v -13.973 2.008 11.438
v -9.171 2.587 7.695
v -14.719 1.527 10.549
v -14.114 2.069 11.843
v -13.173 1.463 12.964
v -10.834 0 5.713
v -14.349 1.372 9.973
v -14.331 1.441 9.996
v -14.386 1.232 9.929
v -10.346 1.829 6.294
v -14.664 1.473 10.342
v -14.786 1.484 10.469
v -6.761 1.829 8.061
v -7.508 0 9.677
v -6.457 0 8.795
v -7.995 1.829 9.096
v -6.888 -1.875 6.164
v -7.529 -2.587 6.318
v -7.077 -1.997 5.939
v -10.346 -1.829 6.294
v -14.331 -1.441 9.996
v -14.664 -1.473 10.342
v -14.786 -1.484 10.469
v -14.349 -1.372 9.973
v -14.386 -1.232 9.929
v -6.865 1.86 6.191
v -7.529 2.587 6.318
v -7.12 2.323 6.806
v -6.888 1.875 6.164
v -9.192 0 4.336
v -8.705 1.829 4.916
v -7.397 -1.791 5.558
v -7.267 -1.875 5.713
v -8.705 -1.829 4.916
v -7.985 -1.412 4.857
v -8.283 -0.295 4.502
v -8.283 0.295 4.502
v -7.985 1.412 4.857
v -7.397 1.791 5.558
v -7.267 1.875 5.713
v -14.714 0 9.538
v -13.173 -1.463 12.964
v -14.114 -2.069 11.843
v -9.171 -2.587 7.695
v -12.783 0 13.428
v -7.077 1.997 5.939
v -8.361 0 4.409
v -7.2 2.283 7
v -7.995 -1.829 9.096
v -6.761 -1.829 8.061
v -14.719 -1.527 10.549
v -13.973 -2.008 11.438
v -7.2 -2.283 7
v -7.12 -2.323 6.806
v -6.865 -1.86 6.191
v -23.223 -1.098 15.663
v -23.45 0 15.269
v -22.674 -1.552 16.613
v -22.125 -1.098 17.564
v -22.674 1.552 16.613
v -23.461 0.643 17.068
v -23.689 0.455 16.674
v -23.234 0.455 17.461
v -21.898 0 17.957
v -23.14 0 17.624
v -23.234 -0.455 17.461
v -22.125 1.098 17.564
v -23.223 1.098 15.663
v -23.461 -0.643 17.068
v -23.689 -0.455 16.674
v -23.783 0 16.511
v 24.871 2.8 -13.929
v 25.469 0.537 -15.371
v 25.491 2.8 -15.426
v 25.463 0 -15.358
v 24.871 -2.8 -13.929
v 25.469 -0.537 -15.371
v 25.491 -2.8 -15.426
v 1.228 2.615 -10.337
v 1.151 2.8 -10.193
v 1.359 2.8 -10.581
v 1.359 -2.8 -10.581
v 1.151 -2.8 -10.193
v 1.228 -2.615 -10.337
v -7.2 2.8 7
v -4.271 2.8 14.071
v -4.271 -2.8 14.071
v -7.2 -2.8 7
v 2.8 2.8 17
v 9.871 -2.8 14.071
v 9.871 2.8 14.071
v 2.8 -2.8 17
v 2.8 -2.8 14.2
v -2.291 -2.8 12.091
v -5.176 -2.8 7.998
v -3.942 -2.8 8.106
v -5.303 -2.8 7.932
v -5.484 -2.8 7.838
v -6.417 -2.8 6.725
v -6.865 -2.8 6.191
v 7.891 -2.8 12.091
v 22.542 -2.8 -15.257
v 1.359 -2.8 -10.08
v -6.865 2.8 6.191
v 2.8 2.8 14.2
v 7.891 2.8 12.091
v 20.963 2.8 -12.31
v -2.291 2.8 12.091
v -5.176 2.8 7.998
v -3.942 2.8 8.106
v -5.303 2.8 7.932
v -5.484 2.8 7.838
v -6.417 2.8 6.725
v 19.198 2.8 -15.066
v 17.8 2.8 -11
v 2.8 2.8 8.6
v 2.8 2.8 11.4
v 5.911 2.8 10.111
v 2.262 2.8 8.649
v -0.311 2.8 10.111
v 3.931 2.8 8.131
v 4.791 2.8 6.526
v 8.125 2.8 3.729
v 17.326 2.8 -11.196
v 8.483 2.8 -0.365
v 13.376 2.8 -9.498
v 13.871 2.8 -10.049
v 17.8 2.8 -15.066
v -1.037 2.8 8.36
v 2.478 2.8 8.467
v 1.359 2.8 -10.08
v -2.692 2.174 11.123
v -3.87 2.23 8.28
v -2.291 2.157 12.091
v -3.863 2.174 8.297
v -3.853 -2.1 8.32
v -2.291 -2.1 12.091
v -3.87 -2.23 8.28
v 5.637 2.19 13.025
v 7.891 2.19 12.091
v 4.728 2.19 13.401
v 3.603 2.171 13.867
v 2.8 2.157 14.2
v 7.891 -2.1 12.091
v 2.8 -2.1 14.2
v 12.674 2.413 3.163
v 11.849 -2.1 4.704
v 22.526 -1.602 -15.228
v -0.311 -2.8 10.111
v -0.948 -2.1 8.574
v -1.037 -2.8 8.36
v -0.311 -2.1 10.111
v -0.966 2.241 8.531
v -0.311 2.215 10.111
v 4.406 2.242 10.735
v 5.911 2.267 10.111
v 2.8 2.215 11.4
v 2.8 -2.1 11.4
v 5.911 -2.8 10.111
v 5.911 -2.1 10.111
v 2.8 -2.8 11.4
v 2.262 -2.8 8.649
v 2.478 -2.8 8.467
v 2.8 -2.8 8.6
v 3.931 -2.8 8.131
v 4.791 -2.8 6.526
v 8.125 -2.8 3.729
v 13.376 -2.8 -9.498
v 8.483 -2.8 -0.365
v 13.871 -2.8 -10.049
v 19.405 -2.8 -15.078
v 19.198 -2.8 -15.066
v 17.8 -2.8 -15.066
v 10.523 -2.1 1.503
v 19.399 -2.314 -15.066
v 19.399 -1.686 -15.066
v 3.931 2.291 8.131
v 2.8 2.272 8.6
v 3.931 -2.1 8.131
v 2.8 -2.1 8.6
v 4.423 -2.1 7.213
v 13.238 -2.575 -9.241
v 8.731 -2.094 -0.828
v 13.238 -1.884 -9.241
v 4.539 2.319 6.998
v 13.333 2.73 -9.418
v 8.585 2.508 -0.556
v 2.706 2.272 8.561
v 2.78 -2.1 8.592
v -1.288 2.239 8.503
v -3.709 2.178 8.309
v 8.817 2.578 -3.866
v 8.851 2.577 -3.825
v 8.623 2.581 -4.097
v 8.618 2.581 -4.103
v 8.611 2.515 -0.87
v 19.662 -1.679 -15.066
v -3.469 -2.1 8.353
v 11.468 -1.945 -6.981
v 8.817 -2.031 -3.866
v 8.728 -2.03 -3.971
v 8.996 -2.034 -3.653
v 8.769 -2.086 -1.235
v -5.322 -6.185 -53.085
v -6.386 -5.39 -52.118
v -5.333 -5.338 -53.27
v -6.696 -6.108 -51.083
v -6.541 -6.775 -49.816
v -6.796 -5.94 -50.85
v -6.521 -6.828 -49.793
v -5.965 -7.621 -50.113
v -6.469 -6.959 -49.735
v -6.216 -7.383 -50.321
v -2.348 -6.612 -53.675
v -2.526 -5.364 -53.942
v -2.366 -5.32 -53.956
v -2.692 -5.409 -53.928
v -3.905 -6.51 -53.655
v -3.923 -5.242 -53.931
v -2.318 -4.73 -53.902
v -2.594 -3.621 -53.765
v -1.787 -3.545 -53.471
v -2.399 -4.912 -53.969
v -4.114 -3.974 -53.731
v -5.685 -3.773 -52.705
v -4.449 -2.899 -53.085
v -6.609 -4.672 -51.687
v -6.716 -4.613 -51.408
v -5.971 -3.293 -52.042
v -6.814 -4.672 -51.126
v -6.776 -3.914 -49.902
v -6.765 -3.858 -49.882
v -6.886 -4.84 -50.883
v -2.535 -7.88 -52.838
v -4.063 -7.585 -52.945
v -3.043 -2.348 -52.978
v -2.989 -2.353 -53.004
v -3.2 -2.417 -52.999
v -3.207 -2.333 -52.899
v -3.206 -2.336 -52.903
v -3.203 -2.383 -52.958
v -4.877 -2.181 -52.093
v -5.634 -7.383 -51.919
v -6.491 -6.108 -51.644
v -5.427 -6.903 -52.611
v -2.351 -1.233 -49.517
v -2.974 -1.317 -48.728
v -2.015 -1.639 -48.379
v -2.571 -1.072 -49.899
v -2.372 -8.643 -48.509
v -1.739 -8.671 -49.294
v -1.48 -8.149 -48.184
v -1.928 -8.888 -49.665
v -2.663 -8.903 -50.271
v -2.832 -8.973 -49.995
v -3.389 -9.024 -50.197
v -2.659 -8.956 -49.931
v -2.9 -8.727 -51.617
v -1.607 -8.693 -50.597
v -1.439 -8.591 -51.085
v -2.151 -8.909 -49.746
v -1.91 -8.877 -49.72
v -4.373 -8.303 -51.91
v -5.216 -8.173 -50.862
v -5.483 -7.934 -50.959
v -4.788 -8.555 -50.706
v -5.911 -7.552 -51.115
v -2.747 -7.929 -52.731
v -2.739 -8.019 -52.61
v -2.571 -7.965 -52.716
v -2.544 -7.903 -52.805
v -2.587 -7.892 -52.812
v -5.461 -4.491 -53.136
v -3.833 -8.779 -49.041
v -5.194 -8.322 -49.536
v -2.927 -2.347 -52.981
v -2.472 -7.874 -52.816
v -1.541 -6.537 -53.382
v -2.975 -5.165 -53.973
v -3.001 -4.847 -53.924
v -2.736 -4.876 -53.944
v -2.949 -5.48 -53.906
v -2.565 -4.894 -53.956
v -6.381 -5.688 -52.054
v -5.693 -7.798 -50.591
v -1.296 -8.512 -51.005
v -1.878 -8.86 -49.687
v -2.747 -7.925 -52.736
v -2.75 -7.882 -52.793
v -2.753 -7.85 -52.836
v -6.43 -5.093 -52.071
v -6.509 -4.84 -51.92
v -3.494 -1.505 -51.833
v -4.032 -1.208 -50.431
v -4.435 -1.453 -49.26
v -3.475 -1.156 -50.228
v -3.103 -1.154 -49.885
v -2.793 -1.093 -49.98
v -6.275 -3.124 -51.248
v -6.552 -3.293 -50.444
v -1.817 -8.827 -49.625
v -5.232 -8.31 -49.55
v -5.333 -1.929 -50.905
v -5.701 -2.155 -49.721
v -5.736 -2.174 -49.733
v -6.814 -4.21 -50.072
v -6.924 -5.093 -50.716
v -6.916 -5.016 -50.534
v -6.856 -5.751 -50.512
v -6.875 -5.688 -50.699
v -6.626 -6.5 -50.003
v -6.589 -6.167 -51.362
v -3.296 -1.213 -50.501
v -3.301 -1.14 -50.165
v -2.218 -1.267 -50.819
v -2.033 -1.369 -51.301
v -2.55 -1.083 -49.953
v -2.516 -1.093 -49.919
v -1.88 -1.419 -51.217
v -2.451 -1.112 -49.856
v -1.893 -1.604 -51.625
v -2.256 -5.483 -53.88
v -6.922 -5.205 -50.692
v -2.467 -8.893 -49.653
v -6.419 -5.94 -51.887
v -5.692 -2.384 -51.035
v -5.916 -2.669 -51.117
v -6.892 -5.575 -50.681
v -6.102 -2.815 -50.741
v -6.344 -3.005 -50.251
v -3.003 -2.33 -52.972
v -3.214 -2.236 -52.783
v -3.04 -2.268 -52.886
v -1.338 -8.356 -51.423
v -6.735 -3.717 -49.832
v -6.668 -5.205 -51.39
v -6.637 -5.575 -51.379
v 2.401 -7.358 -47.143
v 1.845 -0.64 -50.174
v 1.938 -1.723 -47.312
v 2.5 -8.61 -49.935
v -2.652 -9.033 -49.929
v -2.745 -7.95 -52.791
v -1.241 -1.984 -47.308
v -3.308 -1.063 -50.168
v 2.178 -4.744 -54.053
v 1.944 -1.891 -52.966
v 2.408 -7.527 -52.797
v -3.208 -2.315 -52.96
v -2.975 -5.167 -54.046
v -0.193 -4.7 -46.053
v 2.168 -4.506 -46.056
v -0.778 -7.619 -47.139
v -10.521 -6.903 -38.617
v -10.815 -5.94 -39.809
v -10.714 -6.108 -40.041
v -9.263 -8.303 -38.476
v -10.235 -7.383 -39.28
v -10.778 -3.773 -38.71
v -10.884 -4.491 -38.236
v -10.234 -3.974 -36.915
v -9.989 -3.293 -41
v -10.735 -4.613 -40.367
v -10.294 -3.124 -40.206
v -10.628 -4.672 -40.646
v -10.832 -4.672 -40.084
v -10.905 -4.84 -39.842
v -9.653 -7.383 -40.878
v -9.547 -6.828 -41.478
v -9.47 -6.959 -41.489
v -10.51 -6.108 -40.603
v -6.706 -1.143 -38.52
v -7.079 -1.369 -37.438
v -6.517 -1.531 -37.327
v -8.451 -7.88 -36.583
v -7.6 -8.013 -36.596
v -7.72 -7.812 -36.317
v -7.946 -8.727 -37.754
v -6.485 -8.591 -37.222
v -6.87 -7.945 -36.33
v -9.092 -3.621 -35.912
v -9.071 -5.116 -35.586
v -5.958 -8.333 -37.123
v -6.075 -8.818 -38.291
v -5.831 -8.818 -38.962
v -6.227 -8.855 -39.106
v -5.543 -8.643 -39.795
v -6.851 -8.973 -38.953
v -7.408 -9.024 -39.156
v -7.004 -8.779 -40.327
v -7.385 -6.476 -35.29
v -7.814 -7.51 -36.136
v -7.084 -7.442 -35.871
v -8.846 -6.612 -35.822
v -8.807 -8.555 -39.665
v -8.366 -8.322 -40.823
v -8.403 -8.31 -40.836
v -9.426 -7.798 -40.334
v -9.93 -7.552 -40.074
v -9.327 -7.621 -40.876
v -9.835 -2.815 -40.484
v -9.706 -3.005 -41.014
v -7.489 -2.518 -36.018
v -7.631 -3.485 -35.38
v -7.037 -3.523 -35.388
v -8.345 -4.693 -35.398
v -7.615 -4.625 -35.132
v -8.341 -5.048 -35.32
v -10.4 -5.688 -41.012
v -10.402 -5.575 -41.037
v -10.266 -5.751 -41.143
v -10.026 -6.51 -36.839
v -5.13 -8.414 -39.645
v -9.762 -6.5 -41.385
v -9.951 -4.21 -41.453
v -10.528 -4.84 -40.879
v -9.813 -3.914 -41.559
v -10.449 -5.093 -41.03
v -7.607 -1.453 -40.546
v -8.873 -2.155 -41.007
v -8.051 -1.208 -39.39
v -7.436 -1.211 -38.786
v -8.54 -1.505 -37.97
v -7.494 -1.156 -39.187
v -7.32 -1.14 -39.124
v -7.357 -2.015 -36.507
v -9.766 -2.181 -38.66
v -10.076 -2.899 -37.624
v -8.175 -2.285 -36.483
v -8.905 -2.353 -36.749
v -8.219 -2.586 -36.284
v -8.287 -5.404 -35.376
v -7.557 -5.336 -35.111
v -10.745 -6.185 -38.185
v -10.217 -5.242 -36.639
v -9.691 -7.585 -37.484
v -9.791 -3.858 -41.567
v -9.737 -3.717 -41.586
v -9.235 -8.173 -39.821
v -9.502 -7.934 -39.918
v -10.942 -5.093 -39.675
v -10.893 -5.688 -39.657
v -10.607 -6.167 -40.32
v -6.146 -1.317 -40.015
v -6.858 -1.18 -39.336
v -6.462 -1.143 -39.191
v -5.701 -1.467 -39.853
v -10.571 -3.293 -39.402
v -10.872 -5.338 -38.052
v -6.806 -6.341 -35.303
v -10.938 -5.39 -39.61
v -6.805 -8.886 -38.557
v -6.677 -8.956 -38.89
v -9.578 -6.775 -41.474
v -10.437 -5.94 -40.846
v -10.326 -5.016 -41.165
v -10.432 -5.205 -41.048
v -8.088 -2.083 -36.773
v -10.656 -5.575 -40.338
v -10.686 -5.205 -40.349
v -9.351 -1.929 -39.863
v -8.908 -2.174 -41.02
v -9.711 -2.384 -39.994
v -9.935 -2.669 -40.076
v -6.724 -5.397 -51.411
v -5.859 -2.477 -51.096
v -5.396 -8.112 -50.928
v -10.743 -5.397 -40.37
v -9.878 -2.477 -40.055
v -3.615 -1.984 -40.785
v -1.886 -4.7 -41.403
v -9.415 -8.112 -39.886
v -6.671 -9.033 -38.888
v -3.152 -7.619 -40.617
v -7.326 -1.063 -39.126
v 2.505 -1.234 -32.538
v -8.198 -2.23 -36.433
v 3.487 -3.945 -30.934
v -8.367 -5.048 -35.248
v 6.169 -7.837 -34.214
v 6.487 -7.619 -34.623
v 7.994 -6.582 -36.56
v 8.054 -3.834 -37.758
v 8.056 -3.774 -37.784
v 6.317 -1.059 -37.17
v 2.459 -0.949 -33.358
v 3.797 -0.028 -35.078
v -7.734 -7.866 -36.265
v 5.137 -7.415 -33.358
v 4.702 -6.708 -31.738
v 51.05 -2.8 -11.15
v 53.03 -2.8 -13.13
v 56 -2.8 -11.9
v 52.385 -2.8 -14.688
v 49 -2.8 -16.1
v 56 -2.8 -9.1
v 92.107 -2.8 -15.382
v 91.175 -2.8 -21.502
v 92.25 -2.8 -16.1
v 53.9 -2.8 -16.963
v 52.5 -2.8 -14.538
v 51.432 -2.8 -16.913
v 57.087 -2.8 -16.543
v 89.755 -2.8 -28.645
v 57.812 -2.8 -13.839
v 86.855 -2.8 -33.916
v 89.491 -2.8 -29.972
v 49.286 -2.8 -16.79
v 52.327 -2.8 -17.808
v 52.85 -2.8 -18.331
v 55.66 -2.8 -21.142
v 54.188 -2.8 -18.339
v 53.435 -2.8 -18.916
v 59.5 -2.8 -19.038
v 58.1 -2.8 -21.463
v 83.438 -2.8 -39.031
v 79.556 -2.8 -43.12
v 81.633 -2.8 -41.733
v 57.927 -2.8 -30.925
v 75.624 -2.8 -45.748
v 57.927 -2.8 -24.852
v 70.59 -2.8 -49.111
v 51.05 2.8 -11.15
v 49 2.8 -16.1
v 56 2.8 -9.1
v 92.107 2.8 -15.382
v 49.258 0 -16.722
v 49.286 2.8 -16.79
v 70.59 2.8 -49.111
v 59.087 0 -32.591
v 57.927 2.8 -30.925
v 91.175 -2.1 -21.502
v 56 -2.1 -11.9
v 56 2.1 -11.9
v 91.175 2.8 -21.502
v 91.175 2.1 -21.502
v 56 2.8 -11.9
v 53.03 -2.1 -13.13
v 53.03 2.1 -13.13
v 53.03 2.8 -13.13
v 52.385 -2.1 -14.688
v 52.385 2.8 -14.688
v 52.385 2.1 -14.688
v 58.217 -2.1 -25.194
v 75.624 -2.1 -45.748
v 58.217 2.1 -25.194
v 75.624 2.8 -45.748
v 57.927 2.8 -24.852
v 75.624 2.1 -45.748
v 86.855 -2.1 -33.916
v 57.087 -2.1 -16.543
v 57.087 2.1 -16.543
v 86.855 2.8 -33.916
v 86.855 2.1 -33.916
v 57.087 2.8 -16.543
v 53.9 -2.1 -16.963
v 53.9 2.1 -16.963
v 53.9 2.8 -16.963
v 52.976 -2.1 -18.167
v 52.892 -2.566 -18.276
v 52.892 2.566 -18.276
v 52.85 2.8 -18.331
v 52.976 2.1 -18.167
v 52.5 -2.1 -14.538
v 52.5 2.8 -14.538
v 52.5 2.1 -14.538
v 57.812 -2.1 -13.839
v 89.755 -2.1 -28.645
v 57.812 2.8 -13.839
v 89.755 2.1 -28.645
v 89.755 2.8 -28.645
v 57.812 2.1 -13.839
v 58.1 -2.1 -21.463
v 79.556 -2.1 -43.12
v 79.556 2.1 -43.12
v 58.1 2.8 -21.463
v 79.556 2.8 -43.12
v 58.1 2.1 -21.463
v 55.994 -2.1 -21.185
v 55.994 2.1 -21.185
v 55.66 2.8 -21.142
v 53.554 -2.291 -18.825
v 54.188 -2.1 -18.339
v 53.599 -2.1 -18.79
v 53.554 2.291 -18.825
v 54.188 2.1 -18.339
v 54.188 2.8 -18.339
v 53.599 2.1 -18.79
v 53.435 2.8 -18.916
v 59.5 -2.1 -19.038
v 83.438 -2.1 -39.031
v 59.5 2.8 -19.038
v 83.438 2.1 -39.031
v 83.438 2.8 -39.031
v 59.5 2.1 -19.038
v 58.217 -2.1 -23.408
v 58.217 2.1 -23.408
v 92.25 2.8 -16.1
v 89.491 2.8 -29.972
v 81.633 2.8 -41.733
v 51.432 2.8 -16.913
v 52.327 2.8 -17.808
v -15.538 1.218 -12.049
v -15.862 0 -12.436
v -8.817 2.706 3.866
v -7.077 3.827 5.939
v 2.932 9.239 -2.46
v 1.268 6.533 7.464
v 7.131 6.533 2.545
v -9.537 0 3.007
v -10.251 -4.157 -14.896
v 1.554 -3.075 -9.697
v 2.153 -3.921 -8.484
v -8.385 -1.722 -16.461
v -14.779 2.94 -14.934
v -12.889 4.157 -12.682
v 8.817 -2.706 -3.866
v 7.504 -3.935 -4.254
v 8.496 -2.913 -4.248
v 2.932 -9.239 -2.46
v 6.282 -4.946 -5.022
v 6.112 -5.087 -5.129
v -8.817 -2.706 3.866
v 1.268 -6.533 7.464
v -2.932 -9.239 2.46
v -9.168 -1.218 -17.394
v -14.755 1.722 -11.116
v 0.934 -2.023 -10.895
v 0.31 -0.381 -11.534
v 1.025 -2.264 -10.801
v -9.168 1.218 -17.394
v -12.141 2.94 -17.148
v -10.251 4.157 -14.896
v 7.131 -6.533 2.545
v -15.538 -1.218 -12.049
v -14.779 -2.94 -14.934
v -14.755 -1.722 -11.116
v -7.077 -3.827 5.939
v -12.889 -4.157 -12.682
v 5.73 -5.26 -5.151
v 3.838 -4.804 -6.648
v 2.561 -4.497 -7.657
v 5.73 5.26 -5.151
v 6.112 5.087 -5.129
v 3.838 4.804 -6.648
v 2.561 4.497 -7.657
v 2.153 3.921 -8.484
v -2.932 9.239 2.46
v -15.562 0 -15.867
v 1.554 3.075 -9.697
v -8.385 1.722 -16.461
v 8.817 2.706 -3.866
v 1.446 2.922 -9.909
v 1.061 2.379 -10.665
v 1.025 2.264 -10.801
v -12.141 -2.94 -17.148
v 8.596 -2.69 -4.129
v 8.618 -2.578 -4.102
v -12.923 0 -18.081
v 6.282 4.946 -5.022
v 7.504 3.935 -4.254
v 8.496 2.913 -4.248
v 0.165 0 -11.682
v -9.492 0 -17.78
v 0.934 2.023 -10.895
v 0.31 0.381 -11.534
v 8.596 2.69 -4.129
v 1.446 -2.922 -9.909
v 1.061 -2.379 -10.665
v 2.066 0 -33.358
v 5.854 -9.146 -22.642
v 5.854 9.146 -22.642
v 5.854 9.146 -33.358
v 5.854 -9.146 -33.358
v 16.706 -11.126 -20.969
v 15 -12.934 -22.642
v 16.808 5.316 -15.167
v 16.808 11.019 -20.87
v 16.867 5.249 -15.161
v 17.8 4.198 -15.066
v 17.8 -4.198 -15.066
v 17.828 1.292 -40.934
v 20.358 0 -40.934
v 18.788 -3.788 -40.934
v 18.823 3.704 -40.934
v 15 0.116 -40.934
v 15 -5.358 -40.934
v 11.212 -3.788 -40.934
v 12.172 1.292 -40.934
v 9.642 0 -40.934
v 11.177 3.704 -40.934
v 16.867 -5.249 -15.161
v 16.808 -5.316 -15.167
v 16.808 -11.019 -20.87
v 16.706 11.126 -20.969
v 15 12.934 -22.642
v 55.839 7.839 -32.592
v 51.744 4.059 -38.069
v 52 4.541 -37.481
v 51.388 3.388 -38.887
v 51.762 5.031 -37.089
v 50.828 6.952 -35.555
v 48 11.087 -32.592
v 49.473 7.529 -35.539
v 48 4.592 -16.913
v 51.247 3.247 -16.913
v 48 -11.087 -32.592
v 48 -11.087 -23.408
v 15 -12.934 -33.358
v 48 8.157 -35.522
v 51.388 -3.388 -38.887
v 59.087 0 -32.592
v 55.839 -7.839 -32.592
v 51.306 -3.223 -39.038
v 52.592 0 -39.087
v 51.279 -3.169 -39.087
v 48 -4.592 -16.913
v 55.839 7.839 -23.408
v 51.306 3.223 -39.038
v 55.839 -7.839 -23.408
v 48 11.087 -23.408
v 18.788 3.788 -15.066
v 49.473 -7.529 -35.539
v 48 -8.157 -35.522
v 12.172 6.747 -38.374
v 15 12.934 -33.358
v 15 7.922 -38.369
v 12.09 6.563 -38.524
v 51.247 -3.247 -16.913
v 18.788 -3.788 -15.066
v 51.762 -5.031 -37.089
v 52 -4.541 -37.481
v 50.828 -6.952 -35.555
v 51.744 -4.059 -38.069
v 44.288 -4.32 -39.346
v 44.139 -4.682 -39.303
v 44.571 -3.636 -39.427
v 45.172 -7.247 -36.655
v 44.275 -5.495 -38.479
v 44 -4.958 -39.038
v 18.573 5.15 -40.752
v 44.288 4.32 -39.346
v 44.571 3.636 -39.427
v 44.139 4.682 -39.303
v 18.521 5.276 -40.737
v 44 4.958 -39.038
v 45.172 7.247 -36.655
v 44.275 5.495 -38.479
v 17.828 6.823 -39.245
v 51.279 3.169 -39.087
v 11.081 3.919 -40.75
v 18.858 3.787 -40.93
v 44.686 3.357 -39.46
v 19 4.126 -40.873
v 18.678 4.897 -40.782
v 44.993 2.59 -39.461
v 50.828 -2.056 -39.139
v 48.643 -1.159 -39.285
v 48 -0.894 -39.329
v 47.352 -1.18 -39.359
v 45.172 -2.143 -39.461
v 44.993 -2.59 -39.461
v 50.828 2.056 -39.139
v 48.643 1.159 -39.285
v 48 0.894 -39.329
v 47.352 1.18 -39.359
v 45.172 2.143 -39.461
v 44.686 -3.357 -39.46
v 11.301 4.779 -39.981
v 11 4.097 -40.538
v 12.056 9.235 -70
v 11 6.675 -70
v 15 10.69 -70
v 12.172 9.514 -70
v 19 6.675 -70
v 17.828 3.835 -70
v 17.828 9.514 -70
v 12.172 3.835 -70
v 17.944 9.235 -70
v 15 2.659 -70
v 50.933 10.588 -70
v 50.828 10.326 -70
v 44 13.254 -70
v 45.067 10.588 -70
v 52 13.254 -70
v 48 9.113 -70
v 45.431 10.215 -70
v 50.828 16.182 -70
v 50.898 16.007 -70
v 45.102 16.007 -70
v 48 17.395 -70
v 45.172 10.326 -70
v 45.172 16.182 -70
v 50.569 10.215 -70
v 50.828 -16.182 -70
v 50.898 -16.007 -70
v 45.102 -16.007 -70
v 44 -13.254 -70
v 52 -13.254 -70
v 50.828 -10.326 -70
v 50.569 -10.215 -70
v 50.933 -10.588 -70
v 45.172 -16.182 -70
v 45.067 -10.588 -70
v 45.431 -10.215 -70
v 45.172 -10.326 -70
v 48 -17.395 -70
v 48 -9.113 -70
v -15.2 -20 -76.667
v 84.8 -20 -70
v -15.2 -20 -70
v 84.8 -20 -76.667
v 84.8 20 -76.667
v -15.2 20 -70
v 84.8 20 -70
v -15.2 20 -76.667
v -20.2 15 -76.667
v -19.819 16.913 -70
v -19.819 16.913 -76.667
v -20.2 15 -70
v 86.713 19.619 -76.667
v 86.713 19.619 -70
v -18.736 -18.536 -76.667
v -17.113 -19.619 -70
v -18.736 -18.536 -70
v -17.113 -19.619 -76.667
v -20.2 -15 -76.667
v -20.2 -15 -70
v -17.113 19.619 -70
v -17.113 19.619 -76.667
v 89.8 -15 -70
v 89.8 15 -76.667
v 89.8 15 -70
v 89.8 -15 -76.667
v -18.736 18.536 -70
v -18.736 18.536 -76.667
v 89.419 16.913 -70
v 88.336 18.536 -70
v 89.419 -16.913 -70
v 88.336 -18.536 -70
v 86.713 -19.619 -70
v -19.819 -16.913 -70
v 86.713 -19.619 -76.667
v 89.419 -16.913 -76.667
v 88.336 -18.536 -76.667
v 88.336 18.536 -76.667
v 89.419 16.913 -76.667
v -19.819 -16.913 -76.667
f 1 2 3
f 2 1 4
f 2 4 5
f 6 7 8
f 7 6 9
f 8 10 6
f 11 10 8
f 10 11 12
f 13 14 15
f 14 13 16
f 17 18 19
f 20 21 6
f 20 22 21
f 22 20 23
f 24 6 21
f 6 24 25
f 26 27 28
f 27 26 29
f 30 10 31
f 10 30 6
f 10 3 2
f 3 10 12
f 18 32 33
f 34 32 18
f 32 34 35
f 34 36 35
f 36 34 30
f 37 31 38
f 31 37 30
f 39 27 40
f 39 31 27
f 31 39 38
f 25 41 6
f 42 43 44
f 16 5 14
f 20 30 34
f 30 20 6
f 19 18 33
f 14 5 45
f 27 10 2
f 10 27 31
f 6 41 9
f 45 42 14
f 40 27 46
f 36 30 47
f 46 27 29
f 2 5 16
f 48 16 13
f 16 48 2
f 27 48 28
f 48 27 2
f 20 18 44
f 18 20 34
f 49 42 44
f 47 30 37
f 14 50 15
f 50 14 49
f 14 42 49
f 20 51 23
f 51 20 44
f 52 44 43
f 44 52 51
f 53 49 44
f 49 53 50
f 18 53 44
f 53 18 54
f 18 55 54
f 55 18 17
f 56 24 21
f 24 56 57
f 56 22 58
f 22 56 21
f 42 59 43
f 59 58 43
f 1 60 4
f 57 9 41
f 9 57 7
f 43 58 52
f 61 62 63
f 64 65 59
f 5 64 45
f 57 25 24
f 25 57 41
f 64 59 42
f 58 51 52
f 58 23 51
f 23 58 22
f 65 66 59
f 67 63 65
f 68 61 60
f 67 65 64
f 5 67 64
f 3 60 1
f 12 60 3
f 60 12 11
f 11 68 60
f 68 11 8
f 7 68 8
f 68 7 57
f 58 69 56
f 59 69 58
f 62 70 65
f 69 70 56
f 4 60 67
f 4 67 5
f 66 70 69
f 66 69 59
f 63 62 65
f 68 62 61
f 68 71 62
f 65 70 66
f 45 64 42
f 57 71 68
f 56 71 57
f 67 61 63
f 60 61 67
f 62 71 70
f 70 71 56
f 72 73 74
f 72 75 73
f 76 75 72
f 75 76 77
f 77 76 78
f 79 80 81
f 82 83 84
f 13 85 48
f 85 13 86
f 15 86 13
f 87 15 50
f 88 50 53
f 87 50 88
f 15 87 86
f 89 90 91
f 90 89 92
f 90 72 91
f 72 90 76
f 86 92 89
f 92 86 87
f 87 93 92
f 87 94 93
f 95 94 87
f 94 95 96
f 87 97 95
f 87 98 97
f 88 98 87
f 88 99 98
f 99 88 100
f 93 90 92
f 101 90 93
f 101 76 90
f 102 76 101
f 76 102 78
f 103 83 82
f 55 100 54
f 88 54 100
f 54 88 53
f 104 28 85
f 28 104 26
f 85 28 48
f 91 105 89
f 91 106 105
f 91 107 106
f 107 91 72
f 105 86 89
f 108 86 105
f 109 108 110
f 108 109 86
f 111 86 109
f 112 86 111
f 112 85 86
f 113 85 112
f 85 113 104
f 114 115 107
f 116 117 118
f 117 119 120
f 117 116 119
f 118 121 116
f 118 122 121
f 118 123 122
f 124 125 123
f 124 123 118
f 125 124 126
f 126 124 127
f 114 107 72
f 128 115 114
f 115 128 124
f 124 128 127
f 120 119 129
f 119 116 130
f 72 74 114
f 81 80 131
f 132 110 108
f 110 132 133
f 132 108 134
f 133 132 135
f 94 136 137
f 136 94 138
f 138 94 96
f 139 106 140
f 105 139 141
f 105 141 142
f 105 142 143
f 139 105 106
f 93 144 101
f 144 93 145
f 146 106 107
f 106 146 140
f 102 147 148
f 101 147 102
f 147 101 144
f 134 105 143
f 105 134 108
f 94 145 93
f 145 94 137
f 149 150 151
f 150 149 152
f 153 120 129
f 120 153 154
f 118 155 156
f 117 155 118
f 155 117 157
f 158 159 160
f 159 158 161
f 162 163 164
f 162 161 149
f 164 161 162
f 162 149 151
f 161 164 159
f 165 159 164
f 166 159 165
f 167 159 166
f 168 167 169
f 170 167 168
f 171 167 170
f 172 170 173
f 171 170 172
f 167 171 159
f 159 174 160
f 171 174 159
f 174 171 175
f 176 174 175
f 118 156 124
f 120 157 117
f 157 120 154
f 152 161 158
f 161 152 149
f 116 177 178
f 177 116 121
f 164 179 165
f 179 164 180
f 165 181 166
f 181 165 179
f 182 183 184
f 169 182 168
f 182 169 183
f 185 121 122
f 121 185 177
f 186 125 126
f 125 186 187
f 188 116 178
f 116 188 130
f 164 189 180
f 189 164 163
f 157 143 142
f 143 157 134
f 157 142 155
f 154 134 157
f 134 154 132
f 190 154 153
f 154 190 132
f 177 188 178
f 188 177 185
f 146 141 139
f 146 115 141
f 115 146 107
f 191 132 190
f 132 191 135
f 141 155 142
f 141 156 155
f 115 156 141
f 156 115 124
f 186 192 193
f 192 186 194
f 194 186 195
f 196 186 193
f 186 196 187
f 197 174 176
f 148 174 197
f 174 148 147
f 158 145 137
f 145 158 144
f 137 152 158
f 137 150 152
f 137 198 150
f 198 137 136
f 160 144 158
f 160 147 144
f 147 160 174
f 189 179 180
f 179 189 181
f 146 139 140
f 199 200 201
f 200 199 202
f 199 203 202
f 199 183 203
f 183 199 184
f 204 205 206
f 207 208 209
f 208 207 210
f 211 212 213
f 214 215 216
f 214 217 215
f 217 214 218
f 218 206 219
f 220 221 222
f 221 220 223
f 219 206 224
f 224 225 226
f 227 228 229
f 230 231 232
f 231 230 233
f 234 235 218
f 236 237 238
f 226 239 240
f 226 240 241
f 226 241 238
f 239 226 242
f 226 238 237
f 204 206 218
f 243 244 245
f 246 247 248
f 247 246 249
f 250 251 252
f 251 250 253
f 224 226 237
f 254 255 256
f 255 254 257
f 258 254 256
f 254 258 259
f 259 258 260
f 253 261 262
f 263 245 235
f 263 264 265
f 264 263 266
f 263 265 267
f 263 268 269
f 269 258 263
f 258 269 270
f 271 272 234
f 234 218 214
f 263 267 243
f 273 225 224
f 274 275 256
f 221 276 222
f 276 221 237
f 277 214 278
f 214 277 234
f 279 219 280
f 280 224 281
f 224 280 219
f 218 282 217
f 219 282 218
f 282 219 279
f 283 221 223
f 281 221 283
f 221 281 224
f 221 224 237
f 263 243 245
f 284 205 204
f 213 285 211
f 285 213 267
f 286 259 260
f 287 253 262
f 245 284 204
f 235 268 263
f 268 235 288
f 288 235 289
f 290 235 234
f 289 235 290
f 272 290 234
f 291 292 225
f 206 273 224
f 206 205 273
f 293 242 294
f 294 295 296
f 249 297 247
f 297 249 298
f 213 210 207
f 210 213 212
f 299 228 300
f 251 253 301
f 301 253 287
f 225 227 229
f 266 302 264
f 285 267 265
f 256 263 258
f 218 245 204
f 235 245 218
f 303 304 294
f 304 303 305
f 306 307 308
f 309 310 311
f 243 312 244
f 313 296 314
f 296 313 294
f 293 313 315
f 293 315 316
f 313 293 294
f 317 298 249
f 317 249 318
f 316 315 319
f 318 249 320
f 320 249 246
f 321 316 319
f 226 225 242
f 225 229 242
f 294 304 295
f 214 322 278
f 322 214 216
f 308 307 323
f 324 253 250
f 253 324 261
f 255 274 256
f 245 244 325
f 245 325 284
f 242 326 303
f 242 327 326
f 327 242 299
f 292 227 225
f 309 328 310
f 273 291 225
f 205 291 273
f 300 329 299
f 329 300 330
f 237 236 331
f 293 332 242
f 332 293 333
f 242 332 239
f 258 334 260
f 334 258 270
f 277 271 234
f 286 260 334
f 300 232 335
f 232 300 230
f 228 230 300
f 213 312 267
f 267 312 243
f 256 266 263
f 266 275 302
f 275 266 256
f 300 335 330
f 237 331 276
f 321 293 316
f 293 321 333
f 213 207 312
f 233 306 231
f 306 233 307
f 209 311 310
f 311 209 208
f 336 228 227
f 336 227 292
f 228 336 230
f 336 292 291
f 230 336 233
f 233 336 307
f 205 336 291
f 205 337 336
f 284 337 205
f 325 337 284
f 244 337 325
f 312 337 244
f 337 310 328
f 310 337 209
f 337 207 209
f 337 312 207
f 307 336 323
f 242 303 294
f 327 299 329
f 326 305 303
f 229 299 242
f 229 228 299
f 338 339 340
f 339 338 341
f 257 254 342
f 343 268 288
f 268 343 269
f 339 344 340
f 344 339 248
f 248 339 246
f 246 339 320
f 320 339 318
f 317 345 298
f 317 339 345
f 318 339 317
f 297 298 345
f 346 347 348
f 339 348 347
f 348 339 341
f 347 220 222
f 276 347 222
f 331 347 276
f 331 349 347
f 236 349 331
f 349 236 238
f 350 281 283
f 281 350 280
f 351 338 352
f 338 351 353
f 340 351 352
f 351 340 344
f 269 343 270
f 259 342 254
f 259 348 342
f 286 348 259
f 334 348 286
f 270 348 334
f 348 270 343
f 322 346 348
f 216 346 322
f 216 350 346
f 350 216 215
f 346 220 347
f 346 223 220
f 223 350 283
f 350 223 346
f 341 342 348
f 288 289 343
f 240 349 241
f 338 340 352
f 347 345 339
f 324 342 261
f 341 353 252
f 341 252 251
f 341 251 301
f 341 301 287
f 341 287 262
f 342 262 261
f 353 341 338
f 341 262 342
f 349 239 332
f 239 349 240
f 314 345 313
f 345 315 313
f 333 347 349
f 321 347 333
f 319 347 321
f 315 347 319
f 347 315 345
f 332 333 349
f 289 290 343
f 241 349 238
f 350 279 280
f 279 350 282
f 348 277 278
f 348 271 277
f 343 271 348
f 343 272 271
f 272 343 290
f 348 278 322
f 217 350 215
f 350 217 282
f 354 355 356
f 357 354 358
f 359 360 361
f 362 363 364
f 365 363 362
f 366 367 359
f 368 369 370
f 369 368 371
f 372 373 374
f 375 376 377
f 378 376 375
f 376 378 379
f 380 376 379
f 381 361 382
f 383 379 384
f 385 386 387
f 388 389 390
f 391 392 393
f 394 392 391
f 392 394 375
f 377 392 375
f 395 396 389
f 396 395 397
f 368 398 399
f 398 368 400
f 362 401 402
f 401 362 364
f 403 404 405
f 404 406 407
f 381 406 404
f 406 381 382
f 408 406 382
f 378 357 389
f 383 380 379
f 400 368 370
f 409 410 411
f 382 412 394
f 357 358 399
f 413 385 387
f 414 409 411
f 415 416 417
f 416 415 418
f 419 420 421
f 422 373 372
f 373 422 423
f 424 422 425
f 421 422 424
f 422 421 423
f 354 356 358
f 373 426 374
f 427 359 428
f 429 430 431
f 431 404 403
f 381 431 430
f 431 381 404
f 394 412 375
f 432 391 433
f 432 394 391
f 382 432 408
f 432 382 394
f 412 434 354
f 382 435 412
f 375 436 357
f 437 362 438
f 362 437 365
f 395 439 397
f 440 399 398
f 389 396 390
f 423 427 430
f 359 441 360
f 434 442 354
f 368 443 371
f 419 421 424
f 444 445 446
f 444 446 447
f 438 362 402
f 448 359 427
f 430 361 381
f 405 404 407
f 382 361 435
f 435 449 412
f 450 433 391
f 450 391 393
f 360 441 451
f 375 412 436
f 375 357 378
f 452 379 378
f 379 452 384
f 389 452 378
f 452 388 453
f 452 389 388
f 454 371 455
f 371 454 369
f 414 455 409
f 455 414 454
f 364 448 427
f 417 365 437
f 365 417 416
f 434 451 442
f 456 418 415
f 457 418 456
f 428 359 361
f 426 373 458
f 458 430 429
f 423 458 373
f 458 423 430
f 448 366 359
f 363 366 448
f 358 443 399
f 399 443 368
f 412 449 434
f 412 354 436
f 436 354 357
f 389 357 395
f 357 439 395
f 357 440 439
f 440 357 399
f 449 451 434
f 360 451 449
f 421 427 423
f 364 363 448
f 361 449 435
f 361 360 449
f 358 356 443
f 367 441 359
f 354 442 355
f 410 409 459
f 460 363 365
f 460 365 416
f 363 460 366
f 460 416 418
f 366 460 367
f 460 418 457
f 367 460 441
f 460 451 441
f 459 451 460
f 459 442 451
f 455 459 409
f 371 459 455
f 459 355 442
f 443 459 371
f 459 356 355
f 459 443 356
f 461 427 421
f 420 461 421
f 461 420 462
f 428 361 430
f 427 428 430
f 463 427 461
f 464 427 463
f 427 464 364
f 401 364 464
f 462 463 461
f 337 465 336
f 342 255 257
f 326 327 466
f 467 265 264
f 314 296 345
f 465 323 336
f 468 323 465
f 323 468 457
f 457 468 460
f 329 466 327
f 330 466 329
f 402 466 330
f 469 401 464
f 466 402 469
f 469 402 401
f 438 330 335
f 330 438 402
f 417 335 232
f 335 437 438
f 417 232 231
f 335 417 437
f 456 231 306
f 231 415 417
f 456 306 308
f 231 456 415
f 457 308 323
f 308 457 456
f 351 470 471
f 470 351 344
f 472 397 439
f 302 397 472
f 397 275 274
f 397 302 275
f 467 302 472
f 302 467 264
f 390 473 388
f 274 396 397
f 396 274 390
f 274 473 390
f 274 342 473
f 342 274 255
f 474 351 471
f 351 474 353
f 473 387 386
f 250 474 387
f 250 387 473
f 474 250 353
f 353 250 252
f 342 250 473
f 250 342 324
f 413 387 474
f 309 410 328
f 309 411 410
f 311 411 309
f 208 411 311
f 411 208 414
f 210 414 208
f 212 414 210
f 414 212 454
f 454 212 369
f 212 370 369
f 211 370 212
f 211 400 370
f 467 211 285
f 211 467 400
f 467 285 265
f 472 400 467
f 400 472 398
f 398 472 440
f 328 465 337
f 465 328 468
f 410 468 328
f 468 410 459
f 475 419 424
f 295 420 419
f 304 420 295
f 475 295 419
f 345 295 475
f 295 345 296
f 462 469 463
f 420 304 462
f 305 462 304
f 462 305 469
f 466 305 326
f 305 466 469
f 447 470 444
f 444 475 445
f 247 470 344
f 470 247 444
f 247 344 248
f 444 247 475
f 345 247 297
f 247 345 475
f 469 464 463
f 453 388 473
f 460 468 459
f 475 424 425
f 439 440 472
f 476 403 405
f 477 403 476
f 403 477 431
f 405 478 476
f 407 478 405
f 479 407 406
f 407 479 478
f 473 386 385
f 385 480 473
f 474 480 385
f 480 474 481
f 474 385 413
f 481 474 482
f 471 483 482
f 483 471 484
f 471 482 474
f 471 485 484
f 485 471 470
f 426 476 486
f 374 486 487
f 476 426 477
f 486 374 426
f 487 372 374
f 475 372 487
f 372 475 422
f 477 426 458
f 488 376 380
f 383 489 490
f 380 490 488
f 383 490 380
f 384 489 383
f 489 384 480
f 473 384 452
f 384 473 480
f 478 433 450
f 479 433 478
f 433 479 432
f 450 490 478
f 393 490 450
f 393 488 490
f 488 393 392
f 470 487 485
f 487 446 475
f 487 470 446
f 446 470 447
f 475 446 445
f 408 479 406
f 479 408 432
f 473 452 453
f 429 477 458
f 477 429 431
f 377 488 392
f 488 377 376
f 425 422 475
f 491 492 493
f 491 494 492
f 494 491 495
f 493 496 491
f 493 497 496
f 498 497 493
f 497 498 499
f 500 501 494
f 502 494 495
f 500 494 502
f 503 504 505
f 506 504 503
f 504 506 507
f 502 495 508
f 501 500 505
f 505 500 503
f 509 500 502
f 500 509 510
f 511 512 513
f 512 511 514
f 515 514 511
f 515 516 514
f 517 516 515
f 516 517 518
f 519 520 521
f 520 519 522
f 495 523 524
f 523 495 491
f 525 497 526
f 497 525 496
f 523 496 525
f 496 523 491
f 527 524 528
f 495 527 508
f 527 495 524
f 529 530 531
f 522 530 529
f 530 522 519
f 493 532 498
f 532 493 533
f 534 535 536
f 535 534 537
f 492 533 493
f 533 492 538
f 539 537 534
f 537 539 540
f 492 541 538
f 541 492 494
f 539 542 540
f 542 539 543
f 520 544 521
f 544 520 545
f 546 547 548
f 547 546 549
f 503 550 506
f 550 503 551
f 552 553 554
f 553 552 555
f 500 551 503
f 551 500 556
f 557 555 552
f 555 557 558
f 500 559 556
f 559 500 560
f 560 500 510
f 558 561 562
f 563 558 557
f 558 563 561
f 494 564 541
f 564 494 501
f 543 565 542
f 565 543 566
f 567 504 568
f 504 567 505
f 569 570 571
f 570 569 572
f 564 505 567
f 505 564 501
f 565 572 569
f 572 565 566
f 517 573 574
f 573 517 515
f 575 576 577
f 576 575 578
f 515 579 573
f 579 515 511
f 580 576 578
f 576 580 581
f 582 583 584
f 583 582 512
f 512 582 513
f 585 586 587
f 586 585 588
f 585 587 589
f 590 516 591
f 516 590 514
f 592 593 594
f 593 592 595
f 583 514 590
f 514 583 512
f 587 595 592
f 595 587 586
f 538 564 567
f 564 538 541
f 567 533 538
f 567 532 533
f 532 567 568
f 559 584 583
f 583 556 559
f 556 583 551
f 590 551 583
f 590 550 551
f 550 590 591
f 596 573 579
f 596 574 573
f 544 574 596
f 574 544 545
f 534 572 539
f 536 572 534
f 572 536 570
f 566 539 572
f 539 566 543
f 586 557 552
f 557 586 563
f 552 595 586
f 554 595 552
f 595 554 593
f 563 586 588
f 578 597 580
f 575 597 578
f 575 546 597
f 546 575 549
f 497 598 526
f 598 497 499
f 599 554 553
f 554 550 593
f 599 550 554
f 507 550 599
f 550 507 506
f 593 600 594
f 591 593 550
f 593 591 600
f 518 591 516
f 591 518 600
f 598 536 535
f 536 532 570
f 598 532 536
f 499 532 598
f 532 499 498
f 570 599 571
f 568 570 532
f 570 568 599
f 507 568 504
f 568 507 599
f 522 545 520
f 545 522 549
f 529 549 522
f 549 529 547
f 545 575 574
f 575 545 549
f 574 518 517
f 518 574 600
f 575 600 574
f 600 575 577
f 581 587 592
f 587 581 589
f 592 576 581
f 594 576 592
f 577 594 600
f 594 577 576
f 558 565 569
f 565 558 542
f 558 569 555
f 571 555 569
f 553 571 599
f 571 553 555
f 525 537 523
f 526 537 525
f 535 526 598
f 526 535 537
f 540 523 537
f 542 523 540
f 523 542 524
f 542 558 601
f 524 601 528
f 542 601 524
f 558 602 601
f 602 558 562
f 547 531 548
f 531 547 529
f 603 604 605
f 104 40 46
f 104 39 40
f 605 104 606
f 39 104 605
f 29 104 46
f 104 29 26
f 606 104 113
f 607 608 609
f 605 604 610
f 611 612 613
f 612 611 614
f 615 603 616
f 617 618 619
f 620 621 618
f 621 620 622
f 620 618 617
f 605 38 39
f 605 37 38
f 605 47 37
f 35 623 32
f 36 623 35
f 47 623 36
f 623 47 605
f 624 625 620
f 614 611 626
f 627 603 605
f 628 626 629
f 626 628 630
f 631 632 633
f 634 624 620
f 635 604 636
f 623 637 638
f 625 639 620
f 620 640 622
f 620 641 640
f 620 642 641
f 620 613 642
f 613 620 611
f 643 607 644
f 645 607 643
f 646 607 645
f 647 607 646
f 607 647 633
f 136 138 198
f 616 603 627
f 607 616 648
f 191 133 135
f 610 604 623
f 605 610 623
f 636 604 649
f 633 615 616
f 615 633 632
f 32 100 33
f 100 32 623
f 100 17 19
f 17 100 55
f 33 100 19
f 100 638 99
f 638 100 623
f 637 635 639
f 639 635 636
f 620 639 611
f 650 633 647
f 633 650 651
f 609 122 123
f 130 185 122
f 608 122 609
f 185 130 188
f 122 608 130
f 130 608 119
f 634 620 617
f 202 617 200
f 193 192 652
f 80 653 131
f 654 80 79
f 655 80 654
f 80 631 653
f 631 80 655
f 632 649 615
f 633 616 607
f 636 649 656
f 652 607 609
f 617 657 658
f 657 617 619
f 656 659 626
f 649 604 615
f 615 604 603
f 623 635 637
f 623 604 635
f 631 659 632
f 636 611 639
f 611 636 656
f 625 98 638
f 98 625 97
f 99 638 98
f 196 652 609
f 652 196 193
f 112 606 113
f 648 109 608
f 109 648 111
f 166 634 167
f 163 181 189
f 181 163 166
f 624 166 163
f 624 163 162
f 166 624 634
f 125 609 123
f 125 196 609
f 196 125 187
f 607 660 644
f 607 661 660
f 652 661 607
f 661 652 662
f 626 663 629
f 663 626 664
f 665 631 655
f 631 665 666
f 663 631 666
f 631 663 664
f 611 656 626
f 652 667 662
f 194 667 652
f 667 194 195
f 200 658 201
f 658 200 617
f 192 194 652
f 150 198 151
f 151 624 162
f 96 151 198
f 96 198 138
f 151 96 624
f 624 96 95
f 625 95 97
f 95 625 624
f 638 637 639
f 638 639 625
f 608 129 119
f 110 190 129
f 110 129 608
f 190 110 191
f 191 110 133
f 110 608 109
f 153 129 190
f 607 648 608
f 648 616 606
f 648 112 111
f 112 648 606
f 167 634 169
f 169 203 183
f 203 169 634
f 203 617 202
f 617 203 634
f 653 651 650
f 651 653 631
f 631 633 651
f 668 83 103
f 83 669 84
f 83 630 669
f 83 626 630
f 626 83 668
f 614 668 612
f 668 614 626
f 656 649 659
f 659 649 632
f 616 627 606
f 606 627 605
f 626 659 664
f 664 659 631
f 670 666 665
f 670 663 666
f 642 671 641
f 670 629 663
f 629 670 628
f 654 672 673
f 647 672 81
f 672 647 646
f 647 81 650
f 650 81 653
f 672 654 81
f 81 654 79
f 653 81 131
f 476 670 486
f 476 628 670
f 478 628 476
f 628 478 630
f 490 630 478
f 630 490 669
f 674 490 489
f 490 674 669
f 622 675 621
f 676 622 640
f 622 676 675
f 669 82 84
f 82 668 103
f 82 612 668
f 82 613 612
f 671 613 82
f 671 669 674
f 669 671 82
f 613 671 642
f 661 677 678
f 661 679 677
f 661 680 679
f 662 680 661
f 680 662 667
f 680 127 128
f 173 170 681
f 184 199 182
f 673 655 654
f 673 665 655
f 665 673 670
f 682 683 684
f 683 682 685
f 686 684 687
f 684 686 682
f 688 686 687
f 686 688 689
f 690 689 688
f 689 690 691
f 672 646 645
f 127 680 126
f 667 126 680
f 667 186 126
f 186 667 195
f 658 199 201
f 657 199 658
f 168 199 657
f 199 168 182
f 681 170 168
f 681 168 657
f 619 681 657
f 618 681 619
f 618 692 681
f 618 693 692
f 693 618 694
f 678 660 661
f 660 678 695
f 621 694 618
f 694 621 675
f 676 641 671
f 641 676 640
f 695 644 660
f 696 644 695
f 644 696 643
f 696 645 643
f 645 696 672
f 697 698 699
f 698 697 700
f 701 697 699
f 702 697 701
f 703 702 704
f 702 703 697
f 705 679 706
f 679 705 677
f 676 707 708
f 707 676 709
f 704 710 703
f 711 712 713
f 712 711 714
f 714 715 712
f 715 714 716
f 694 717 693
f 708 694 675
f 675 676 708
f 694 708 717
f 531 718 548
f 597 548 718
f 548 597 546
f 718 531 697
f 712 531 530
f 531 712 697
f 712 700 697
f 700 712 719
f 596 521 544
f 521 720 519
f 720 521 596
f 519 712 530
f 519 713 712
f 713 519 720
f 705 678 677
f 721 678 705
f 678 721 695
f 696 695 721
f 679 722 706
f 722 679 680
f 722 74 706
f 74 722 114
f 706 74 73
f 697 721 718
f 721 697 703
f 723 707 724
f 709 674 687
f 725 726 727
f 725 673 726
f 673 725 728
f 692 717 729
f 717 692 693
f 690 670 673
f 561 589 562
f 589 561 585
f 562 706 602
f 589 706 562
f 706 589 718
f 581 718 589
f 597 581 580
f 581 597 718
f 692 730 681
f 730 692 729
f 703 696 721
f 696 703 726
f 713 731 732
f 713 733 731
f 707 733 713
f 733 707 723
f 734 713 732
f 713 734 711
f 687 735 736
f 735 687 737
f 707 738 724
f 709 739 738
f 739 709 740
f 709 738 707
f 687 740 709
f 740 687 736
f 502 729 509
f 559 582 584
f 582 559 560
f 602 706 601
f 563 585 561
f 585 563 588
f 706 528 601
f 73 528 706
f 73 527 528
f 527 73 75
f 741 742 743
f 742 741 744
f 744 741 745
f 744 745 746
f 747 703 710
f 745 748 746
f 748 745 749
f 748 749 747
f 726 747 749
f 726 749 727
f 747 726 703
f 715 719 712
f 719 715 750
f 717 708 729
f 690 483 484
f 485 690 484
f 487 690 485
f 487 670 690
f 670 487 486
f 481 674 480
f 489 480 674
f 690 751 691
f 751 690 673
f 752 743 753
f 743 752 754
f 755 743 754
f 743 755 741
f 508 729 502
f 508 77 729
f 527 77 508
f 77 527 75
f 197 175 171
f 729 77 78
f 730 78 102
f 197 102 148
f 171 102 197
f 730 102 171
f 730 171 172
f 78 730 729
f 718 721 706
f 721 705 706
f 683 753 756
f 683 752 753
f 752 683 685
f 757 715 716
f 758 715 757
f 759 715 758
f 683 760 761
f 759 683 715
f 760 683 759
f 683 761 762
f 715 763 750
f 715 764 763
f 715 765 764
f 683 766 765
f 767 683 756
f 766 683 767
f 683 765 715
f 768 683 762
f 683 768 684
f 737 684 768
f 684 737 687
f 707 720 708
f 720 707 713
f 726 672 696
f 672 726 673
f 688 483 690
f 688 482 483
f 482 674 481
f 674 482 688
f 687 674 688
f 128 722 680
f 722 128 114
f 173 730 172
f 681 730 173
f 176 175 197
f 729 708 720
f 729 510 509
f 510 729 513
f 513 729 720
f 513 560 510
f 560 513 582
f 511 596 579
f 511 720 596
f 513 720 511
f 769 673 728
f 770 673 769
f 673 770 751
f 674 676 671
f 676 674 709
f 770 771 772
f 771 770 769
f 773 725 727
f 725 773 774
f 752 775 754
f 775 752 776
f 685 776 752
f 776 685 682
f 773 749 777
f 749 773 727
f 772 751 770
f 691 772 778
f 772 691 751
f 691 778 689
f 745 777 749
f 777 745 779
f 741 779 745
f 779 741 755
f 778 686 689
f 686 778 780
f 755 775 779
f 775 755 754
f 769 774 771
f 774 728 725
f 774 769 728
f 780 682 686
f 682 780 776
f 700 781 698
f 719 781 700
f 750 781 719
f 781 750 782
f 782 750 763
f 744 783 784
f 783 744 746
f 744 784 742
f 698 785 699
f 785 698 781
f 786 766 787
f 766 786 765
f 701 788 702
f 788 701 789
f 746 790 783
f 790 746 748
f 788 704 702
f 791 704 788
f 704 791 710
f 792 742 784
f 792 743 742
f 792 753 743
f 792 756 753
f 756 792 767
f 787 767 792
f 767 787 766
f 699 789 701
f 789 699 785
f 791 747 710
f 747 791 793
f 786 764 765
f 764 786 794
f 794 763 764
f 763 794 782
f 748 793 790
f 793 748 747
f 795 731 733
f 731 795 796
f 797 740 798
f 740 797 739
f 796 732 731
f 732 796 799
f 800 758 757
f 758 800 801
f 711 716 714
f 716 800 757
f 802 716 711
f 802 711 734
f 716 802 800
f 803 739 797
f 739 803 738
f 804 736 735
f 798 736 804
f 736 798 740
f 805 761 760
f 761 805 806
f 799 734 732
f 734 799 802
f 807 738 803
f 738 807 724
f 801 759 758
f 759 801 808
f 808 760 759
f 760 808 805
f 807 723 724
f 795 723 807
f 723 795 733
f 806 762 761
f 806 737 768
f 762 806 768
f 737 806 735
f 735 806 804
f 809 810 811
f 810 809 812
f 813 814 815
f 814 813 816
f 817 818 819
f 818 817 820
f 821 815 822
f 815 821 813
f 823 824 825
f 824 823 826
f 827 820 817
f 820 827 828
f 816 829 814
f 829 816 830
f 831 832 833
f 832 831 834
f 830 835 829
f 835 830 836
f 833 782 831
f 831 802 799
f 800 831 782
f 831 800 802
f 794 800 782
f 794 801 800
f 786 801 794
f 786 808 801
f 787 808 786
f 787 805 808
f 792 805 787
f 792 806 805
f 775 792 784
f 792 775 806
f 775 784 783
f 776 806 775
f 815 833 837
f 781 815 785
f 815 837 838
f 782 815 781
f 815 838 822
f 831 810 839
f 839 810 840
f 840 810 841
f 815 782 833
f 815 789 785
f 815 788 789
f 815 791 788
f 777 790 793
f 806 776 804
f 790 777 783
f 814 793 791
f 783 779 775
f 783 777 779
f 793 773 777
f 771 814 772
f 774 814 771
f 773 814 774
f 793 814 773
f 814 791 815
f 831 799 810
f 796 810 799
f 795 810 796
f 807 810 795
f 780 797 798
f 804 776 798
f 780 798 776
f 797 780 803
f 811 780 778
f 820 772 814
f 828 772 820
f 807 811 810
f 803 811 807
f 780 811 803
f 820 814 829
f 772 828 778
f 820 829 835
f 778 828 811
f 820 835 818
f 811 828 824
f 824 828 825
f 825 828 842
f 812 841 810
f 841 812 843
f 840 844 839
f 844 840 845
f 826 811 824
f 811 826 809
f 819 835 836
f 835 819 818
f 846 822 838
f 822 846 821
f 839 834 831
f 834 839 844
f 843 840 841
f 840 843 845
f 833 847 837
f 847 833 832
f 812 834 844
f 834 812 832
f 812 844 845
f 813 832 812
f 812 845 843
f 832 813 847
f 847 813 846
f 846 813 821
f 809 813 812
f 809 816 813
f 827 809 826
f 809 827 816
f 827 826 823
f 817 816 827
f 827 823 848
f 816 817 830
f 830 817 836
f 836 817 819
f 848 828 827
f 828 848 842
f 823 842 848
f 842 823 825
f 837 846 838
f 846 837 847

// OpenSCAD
// Cadcorn by Paul Houghton © 2015, CC BY-NC-AS license, https://creativecommons.org/licenses/
low_poly = 8;
high_poly = 64;
low_poly_joint = 16;
high_poly_joint = 64;

$fn=low_poly;
joint_poly = low_poly_joint;
scale = 1;

head_big_radius = 10*scale;
head_small_radius = 4.5*scale;
head_length = 18*scale;
head_angle = 50;

horn_length = 20*scale;
horn_radius = 2.8*scale;

mane_thickness = 2*horn_radius;
mane_radius = head_big_radius;
mane_height = head_big_radius * 0.7;
mane_x = head_big_radius * 0.28;
mane_length_x = 10*scale;
mane_length_z = 20*scale;

hair_thickness = mane_thickness / 8;
hair_spacing = mane_thickness / 2;

neck_radius = 3*scale;
neck_ratio = .2; // Flattens the interface to the top body
neck_top_x = 3*scale;

body_x = 15*scale;
body_z = 28*scale;
body_radius = 14*scale;
body_back_radius = 12*scale;
body_length = 33*scale;

leg_length = (33*scale + body_radius);
leg_radius = 4*scale;

cute_leg_first_ratio = 0.5;
cute_leg_second_ratio = 0.25;
cute_leg_third_ratio = 0.11;

tail_thickness = mane_thickness;
tail_radius = 10 * hair_thickness;
tail_x = 2*body_x + body_length - tail_radius;
tail_height = -body_z + 1.7*tail_radius;
tail_tip_length = 29*scale;

base_thickness = 10*scale;
base_width = 40*scale;
base_corner_radius = 5*scale;
base_length = 100*scale;

module head() {
    rotate([0, -head_angle, 0]) {
        hull () {
            sphere(r=head_big_radius);
            translate([-head_length, 0, 0])
                sphere(r=head_small_radius);    
        }
    }
}

module horn() {
    rotate([0, -head_angle, 0]) {
        translate([0, 0, head_big_radius - .2*scale])
        cylinder(h = horn_length, r1 = horn_radius, r2 = 0);
    }
}

module chili_horn() {
    rotate([0, -head_angle, 0]) {
        z = 1.1*scale + head_big_radius - .2*scale;
        translate([0, 0, z])
            hull() {
                sphere(r = horn_radius);
                translate([0, 0, horn_length/3])
                    sphere(r = horn_radius * .8);
            }
       translate([0, 0, z + horn_length/3])
            hull() {
                sphere(r = horn_radius * .8);
                rotate([0, -10, 0]) {
                    translate([0, 0, 3*horn_length/6])
                        sphere(r = horn_radius * .6);
                }
            }
    }
}

module neck() {
    hull() {
        translate([neck_top_x, 0, 0]) rotate([0, 180, 0]) {
            cylinder(h = head_big_radius - .2*scale, r1 = neck_radius, r2 = neck_radius);
        }
        translate([body_x, 0, -body_z])
            difference() {
                sphere(r = body_radius);
                translate([body_radius*neck_ratio, -body_radius, -body_radius])
                    cube([body_radius, 2*body_radius, 2*body_radius]);
            }
        }
}

module hair_line(x = 0, z = 0, hair_radius = mane_radius, delta_x = body_x, delta_z = body_z) {
    translate([x, 0, z])
            difference() {
                hull() {
                    cylinder(h = mane_thickness, r = hair_radius);
                    translate([delta_x, -delta_z, 0])
                        cylinder(h = mane_thickness, r = hair_radius);
                }
                hull() {
                    cylinder(h = mane_thickness, r = hair_radius - hair_spacing);
                    translate([delta_x, -delta_z, 0])
                        cylinder(h = mane_thickness, r = hair_radius - hair_spacing);
                }                
            }
}

module mane() {
    translate([mane_x, mane_thickness/2, mane_height])
        rotate([90, 0, 0]) {
                hull() {
                    translate([0, 0, hair_thickness])
                    cylinder(h = mane_thickness - 2*hair_thickness, r = mane_radius);
                    translate([body_x, -body_z, 0])
                       cylinder(h = mane_thickness - 2*hair_thickness, r = mane_radius);
                }
              hair_line();
              hair_line(hair_radius = mane_radius - 2*hair_spacing);
        }
}

module body() {
    translate([body_x, 0, -body_z])
        hull() {
            sphere(r = body_radius);
            translate([body_length, 0, 0]) 
                sphere(r = body_back_radius);
        }
}

module leg(lengthwards=0, sideways=0, theta=20) {
    translate([body_x + lengthwards, sideways, -body_z])
        rotate([180 + theta, 0, 0]) {
        cylinder(h = leg_length, r1 = leg_radius, r2 = leg_radius);
        }
}

module cute_leg(lengthwards=0, sideways=0, downwards=0, theta=20, rise_angle=70) {
    translate([body_x + lengthwards, sideways, -body_z - downwards])
        rotate([180 + theta, rise_angle, 0]) {
            cylinder(h = leg_length*cute_leg_first_ratio, r1 = leg_radius, r2 = leg_radius);
            translate([0, 0, leg_length*cute_leg_first_ratio])
                union() {
                    sphere($fn = joint_poly, r = leg_radius);
                    rotate([0, 90, 0]) {
                        cylinder(h = leg_length*cute_leg_second_ratio, r1 = leg_radius, r2 = leg_radius);
                    }
                    translate([leg_length*cute_leg_second_ratio, 0, 0])
                        union() {
                            sphere($fn = joint_poly, r = leg_radius);
                            rotate([0, 90 + rise_angle, 0]) {
                                cylinder(h = leg_length*cute_leg_third_ratio, r1 = leg_radius, r2 = leg_radius);
                            }
                        }
                }
    }
}

module tail_outer_hair() {
    translate([0, 0, -hair_thickness])
        difference() {
            hull() {
                cylinder(h = tail_thickness, r = tail_radius);
                translate([body_x, -1.2*body_z, 0])
                    rotate([0, 0, 11]) {
                        cube([tail_tip_length, tail_tip_length, tail_thickness]);
                    }
            }
            hull() {
                cylinder(h = tail_thickness, r = tail_radius - hair_spacing);
                translate([body_x + 2*hair_spacing, -1.2*body_z + hair_spacing, 0]) rotate([0, 0, 11]) {
                    cube([tail_tip_length - 2.8*hair_spacing, tail_tip_length - 2.8*hair_spacing, tail_thickness]);
                }
            }
        }
}

module tail_single_hair(n=1) {
    translate([0, -4.5*n, -hair_thickness])
        rotate([0, 0, -15*n]) {
            difference() {
                hull() {
                    cylinder(h = tail_thickness, r = tail_radius);
                    translate([body_x, -1.2*body_z, 0])
                        rotate([0, 0, 11]) {
                            cube([tail_tip_length, tail_tip_length, tail_thickness]);
                        }
                }
                union() {
                    hull() {
                        cylinder(h = tail_thickness, r = tail_radius - hair_spacing);
                        translate([body_x + 2*hair_spacing, -1.2*body_z + hair_spacing, 0]) rotate([0, 0, 11]) {
                            cube([tail_tip_length - 2.8*hair_spacing, tail_tip_length - 2.8*hair_spacing, tail_thickness]);
                        }
                    }
                    rotate([50, 90, 0]) {
                        translate([-3*scale, -7*scale, 0]) cylinder(r = 6*scale, h = 40*scale);
                    }
                }
            }
        }
}

module tail() {
    translate([tail_x, tail_thickness/2 - hair_thickness, tail_height])
        rotate([90, 0, 0]) {
            intersection() {
                union() {
                    hull() {
                        cylinder(h = tail_thickness - 2*hair_thickness, r = tail_radius);
                        translate([body_x, -1.2*body_z, 0])
                            rotate([0, 0, 11]) {
                               cube([tail_tip_length, tail_tip_length, tail_thickness - 2*hair_thickness]);
                            }
                    }
                    tail_outer_hair();
                    tail_single_hair(n=1);
                    tail_single_hair(n=2);
                }
                translate([0, 0, -hair_thickness])
                    cylinder($fn = 16, h = 10*scale+tail_thickness, r = tail_tip_length*1.25);
            }
        }
}

module base() {
    translate([body_x + 0.6*body_length, 0, -leg_length - body_z])
        minkowski() {
            cylinder($fn = joint_poly, h = base_thickness / 3, r = base_corner_radius);
            cube([base_length, base_width - 2*base_corner_radius, base_thickness/3], center = true);
        }
}

union() { // difference() -> no base, or union() -> solid base
    union() {
        head();
//        horn();  // Uncomment either horn() or chili_horn or neither
        color("red") chili_horn();
        neck();
        mane();
        body();
        leg(theta=5, sideways=3*scale);
        cute_leg(theta=-5, sideways=-3*scale, downwards=3*scale);
        leg(lengthwards = body_length, sideways=2*scale, theta=15);
        leg(lengthwards = body_length, sideways=-2*scale, theta=-15);
        tail();
    }
    base();
}
